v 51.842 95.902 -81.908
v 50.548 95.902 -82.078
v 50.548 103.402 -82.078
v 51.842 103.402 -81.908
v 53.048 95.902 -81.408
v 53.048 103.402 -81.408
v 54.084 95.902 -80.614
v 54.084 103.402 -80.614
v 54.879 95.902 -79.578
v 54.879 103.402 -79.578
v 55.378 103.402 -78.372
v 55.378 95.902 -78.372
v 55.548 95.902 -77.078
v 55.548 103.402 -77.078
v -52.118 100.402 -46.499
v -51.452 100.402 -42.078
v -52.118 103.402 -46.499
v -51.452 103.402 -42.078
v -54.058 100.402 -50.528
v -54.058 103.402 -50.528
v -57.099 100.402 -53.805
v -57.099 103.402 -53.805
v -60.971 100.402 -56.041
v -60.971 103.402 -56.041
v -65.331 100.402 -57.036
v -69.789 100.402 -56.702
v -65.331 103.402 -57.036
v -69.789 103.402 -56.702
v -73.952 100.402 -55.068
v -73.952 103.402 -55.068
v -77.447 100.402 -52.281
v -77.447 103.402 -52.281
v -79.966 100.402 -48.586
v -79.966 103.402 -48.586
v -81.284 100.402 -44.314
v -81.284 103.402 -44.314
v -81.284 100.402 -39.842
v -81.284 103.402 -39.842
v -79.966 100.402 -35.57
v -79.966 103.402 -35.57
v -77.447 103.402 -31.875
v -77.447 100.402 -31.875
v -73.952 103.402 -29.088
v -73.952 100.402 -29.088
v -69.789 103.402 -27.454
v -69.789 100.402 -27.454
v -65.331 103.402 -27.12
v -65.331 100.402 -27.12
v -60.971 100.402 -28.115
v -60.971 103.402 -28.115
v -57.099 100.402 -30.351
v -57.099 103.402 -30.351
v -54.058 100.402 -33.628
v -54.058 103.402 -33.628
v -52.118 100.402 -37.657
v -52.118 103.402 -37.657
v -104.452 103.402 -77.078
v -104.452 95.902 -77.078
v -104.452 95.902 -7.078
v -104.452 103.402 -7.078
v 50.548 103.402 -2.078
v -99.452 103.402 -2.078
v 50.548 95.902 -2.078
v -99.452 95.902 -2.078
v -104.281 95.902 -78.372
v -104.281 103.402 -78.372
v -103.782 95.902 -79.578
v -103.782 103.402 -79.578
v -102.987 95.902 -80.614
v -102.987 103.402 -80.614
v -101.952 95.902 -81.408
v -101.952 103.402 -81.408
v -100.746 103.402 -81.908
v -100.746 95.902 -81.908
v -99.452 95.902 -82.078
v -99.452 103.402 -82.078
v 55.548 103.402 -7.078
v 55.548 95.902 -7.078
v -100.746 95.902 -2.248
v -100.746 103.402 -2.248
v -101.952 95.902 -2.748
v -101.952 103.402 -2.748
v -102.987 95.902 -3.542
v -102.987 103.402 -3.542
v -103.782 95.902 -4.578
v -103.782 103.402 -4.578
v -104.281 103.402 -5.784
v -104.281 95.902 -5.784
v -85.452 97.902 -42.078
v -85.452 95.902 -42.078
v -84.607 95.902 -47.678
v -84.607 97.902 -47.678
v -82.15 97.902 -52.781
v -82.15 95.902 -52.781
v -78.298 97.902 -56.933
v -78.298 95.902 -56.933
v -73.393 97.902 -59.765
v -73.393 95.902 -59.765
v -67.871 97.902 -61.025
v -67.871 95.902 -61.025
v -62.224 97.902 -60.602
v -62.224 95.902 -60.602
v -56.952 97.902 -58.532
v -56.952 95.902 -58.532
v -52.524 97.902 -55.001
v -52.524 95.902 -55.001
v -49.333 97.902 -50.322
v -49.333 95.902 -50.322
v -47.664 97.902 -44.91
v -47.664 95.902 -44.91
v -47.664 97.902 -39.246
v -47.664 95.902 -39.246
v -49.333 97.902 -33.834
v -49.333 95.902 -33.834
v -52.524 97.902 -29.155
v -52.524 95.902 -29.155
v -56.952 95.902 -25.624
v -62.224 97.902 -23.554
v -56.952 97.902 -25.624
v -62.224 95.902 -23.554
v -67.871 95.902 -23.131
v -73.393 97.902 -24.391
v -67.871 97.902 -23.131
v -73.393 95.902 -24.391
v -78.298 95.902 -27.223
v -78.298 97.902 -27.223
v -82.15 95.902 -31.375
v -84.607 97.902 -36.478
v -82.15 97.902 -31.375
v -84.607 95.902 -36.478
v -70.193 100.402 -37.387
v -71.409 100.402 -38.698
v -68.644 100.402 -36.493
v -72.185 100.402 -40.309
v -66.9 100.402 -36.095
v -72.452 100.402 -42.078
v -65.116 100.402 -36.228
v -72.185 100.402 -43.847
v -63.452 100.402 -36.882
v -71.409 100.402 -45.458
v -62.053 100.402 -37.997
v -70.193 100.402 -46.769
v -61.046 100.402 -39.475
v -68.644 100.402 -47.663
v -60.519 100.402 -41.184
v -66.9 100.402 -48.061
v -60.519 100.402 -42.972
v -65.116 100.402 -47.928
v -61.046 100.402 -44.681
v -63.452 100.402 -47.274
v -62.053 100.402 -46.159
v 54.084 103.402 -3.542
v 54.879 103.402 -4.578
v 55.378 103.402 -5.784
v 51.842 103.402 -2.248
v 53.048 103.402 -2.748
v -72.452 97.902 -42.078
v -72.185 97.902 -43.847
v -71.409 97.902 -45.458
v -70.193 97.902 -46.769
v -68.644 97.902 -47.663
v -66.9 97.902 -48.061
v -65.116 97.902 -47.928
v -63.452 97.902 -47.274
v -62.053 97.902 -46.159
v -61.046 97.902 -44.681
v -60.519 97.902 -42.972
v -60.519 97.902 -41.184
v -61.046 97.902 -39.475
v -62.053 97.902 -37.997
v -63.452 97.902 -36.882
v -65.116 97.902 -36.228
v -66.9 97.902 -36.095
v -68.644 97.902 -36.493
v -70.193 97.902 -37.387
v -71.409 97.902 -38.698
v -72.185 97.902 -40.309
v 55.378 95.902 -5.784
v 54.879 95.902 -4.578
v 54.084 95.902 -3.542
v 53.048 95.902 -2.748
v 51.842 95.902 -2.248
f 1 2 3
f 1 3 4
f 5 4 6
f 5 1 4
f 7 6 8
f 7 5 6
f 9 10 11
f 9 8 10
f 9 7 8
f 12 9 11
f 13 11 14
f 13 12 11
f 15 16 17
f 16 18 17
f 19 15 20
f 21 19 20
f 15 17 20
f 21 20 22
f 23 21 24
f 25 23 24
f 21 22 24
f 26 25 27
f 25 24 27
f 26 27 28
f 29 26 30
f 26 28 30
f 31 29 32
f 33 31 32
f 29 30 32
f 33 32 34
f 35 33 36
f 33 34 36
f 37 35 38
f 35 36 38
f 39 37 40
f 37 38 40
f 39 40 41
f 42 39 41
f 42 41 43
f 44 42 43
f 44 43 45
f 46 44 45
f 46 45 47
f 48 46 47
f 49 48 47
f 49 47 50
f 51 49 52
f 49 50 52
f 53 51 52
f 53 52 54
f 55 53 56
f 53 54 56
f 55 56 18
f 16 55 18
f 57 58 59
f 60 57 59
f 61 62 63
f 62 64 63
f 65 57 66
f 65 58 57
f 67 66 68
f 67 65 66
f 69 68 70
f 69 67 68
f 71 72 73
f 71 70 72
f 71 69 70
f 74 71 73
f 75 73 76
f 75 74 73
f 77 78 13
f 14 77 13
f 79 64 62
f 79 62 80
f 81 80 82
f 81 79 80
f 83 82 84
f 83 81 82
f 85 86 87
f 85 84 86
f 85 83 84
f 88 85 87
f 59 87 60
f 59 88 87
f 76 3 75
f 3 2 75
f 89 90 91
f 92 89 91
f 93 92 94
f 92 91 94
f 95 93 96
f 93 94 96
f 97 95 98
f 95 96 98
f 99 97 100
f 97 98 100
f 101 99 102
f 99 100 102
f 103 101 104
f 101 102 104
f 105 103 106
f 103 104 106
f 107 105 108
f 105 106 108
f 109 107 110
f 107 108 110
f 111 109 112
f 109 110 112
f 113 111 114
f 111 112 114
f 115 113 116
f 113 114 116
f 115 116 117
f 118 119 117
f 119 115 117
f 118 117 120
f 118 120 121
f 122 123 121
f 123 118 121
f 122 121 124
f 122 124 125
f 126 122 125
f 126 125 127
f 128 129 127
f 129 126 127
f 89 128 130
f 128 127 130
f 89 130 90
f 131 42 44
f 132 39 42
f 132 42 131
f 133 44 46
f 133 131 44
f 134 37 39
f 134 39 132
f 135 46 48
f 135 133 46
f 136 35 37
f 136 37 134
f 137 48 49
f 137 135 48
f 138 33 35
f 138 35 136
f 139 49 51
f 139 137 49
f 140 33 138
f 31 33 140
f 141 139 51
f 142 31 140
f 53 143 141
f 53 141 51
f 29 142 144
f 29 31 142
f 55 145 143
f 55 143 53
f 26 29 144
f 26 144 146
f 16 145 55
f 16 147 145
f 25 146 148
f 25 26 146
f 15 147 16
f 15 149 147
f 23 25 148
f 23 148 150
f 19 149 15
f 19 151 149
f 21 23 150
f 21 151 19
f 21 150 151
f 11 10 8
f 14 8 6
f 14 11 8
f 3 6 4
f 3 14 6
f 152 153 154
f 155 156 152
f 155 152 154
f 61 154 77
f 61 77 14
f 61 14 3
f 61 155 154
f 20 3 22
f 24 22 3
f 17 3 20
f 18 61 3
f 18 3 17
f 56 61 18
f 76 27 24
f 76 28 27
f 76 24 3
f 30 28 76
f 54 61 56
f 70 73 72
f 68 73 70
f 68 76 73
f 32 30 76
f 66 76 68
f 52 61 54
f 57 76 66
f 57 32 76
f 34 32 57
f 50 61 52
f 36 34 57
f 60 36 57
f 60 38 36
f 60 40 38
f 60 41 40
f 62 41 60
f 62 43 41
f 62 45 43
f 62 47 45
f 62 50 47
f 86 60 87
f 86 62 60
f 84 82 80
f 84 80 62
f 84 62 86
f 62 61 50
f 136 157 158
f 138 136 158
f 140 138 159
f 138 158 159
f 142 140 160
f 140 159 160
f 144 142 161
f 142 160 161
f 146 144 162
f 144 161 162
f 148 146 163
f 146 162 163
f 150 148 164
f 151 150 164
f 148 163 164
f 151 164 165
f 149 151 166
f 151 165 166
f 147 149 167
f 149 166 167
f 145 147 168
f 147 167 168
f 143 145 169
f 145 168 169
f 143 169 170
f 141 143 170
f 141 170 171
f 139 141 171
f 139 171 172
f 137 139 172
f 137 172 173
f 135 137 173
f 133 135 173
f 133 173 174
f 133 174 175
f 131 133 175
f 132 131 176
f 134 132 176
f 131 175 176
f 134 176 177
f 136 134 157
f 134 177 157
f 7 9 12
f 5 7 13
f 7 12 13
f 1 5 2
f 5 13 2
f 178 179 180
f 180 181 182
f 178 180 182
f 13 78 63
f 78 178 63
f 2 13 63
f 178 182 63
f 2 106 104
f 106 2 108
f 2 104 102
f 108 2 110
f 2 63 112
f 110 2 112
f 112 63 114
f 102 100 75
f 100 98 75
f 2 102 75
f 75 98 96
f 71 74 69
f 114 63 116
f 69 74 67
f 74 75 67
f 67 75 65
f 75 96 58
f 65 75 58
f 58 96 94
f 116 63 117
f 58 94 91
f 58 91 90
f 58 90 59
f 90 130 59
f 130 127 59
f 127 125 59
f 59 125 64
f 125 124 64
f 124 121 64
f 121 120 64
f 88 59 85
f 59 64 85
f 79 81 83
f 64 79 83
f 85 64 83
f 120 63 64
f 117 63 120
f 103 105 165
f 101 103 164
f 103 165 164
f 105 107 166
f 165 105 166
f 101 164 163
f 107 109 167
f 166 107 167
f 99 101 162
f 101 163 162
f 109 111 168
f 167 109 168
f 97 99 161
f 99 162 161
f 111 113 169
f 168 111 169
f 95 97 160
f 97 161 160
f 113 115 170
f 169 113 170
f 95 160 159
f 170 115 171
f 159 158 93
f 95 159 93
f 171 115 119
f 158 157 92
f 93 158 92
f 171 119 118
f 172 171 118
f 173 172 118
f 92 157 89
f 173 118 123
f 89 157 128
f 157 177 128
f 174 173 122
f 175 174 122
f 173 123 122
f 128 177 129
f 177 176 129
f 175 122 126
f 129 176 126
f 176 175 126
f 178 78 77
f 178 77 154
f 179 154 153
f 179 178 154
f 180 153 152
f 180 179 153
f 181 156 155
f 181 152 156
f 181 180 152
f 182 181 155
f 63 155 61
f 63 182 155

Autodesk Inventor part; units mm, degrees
ref_plane "YZ Plane" through (0, 0, 0) normal (1, 0, 0) x (0, 1, 0)
ref_plane "XZ Plane" through (0, 0, 0) normal (0, 1, 0) x (-1, 0, 0)
ref_plane "XY Plane" through (0, 0, 0) normal (0, 0, 1) x (1, 0, 0)
ref_plane "Work Plane1" through (-24.4516, 95.9016, -42.078) normal (0, 1, 0) x (-1, 0, 0)
sketch "BaseTop" plane through (-24.4516, 95.9016, -42.078) normal (0, 1, 0) x (-1, 0, 0)
  line L0 (75, 40) -> (-75, 40)
  line L1 (-80, 35) -> (-80, -35)
  line L2 (-75, -40) -> (75, -40)
  line L3 (80, -35) -> (80, 35)
  circle A0 centre (42, 0) radius 6
  arc A1 (80, 35) -> (75, 40) centre (75, 35) ccw
  arc A2 (75, -40) -> (80, -35) centre (75, -35) ccw
  arc A3 (-80, -35) -> (-75, -40) centre (-75, -35) ccw
  arc A4 (-75, 40) -> (-80, 35) centre (-75, 35) ccw
  circle A5 centre (42, 0) radius 19
  point P0 (-24.4516, 42.078)
  dimension "d1" = 12
  dimension "d2" = 5
  dimension "d15" = 38
extrude "Extrusion1" add sketch "BaseTop" along normal blind 7.5 contours A1 L3 A2 L2 A3 L1 A4 L0 | A0 | A5
extrude "Extrusion6" cut sketch "BaseTop" along normal blind 2 contours A0 | A5
sketch "Sketch6" plane through (-24.4516, 103.4016, -42.078) normal (0, 1, 0) x (1, 0, 0)
  circle A0 centre (-42, 0) radius 15
  point P0 (24.4516, -42.078)
  dimension "d20" = 30
extrude "Extrusion7" cut sketch "Sketch6" against normal blind 3
extrude "Extrusion8" cut sketch "BaseTop" along normal through all contours A0
properties part number "BaseTop"
